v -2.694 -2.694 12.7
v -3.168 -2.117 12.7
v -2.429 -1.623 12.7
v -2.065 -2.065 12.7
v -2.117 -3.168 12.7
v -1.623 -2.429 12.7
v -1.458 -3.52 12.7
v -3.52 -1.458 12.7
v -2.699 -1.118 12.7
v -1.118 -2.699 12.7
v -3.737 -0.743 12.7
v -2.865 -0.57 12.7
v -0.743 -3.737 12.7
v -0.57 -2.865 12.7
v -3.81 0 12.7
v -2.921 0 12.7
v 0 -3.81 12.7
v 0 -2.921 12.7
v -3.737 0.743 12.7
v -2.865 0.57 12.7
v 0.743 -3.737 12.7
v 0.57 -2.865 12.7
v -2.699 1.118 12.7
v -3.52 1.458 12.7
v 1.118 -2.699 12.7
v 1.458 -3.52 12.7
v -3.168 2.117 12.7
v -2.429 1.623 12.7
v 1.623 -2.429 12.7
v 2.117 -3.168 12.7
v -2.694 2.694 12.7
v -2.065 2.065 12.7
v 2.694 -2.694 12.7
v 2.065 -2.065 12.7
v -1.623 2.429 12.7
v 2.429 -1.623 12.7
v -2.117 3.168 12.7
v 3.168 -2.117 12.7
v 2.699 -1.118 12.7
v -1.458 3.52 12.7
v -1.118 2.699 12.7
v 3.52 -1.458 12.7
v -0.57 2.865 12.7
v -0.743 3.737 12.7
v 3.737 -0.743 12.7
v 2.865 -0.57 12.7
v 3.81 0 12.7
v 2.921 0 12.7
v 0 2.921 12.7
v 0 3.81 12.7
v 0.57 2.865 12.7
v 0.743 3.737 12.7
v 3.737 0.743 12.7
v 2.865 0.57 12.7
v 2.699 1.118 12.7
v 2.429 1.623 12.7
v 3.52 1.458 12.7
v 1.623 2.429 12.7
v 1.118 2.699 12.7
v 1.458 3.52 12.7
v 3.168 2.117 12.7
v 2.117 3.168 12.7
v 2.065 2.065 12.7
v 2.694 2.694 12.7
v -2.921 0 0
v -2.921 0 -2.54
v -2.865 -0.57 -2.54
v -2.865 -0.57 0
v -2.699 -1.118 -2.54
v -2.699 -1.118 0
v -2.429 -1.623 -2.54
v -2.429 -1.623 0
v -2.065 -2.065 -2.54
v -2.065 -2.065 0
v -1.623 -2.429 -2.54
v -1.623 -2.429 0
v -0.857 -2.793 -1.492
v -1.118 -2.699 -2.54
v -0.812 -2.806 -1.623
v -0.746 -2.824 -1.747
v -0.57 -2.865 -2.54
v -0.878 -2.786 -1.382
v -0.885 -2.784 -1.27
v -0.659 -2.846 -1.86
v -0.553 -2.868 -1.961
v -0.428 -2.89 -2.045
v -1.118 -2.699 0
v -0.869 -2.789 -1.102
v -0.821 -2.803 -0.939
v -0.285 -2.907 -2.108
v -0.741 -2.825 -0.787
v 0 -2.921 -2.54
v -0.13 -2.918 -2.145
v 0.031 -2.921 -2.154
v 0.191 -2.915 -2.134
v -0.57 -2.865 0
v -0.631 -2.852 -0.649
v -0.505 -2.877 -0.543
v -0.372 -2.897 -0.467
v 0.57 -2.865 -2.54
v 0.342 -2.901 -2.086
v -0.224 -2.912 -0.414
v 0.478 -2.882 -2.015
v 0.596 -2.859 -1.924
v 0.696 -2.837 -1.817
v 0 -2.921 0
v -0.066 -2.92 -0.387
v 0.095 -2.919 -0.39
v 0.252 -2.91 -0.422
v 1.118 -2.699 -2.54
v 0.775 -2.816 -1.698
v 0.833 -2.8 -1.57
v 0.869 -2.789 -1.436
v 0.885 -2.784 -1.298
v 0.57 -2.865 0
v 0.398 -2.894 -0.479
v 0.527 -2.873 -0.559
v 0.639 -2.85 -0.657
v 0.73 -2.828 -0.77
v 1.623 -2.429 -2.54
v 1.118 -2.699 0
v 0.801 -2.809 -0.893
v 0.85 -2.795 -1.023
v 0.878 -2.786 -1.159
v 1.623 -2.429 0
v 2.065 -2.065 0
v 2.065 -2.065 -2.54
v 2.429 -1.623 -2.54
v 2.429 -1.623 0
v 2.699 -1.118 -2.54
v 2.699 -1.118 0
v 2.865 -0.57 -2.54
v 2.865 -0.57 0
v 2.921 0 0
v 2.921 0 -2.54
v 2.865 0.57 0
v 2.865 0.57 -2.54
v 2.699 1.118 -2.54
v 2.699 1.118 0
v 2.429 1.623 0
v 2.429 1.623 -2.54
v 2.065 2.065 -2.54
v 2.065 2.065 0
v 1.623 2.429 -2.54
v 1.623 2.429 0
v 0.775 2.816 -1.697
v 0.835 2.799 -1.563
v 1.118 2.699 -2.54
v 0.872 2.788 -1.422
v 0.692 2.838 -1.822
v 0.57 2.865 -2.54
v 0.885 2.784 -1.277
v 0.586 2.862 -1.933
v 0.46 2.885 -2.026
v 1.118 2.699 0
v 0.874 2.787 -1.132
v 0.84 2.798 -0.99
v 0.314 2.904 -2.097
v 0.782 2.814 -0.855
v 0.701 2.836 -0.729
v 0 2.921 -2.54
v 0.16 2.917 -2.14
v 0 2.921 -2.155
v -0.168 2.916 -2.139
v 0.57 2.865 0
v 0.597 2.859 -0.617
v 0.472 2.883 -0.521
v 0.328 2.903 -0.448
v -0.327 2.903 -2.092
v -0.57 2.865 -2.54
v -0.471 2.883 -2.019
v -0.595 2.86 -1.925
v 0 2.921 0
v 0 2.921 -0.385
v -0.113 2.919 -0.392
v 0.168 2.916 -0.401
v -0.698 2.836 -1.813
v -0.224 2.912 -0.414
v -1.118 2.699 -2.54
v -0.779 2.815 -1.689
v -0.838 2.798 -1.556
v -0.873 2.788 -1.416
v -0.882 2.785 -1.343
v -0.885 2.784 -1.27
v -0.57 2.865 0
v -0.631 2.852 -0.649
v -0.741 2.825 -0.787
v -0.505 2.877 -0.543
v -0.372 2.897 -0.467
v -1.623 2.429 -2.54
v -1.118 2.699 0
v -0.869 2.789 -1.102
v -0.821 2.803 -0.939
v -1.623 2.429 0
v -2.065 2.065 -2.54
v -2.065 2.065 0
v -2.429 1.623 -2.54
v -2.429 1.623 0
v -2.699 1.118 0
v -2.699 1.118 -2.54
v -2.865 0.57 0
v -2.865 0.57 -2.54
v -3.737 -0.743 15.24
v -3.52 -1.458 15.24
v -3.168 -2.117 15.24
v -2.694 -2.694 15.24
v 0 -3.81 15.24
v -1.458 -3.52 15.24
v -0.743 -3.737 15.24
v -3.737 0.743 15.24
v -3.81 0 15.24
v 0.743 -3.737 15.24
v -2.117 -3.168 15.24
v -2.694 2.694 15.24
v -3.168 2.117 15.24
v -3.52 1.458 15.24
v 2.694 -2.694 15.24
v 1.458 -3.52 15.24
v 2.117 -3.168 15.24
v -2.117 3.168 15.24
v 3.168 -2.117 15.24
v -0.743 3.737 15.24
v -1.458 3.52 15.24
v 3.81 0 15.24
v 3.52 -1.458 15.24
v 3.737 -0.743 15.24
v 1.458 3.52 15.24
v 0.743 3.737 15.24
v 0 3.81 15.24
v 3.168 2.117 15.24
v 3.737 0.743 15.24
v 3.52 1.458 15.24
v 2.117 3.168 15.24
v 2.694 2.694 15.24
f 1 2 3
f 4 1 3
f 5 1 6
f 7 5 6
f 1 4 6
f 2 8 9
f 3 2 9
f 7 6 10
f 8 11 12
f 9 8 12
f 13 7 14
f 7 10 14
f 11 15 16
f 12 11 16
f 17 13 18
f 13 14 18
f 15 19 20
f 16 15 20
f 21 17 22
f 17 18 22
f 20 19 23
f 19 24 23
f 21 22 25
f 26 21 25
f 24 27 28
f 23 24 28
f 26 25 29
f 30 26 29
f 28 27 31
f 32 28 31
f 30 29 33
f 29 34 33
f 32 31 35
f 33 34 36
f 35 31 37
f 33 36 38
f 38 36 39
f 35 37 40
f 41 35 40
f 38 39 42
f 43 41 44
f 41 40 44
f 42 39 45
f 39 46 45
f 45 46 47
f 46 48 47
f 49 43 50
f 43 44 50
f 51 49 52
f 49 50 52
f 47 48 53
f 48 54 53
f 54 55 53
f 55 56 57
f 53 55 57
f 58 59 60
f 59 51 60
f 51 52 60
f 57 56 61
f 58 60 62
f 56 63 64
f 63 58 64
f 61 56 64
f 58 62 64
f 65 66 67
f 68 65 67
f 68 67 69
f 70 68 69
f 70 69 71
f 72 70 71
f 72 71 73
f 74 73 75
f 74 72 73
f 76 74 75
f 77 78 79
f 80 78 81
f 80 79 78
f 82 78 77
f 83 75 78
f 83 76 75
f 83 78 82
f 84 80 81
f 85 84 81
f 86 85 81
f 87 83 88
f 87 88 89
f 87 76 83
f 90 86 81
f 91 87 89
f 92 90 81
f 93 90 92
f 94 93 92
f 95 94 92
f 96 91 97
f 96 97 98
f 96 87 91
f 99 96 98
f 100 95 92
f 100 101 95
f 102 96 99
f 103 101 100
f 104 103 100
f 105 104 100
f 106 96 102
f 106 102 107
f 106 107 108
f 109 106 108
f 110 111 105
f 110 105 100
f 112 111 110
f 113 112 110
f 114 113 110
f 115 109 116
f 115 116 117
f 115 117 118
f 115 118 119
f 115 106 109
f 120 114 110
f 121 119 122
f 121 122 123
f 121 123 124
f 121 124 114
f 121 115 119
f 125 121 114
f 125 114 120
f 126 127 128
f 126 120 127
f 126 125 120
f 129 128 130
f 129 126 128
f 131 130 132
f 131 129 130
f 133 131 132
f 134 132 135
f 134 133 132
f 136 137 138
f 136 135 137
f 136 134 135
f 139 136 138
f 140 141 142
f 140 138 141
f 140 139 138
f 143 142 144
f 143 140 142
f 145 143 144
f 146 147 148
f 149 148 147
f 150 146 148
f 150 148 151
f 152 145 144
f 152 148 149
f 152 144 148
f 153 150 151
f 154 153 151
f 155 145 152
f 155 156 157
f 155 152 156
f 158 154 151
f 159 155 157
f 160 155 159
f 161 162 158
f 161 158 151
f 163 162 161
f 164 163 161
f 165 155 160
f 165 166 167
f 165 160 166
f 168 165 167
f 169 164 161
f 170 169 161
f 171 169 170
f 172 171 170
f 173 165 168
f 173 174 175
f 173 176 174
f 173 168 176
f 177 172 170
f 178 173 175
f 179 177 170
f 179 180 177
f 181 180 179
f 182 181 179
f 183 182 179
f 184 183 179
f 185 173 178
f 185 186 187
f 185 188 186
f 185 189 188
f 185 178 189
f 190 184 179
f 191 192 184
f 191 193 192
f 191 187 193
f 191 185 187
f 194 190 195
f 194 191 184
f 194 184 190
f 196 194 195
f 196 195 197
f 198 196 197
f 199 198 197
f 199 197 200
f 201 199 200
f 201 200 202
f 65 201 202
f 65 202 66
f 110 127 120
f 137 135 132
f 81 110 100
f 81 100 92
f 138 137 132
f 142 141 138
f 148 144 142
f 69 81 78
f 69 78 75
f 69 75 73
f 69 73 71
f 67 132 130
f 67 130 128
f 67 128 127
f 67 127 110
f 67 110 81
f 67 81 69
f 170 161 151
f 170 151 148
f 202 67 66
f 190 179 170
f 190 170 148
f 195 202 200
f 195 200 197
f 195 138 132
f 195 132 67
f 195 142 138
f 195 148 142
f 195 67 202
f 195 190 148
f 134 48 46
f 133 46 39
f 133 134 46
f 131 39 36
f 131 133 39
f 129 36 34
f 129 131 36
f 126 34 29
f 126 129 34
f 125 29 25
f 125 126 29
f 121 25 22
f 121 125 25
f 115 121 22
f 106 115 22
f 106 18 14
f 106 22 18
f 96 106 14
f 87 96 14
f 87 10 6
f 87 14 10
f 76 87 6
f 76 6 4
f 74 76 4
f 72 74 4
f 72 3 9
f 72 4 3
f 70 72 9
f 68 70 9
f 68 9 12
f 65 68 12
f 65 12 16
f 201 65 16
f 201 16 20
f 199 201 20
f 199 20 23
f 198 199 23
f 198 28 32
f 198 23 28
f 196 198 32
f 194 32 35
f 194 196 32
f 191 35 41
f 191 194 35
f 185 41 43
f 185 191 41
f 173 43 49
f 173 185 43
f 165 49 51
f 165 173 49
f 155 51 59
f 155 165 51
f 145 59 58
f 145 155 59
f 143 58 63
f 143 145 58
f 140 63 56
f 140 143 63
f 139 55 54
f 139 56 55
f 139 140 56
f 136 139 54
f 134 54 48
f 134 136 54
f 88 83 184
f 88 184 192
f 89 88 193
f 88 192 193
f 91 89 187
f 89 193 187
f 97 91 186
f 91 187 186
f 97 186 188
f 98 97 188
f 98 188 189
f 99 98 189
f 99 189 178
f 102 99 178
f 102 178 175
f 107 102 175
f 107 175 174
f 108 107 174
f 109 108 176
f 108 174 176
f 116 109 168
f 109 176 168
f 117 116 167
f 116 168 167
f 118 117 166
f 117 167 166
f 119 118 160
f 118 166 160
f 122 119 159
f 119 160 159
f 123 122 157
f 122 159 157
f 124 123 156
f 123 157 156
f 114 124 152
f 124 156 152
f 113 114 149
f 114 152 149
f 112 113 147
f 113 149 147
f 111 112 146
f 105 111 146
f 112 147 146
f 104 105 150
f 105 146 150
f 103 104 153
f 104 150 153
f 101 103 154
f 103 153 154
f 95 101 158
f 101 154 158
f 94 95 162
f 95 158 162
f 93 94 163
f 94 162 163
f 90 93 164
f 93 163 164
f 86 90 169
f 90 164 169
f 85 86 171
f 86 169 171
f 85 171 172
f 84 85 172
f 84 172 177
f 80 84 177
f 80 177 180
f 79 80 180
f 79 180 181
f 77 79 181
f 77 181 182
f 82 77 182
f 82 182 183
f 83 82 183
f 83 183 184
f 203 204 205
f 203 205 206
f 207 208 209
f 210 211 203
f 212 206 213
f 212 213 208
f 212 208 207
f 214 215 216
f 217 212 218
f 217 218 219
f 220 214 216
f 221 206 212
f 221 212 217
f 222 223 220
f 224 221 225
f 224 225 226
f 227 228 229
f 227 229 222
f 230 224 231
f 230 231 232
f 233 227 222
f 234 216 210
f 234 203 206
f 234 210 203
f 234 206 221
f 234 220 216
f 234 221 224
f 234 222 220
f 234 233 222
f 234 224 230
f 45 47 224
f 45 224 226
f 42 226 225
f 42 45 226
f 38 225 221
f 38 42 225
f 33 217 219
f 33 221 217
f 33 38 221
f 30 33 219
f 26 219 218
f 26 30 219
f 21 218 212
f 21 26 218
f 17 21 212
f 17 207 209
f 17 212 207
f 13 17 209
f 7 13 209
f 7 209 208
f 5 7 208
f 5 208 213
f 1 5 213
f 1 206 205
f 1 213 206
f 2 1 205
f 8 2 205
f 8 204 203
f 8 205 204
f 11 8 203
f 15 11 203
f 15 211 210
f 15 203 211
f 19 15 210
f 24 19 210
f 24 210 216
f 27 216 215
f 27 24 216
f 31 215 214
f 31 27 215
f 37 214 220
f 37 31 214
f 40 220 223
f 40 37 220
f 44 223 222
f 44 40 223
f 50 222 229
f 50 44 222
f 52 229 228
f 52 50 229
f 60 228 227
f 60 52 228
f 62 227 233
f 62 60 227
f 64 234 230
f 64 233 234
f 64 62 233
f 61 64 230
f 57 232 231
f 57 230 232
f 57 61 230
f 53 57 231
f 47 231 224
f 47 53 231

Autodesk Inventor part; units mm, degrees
ref_plane "YZ Plane" through (0, 0, 0) normal (1, 0, 0) x (0, 1, 0)
ref_plane "XZ Plane" through (0, 0, 0) normal (0, 1, 0) x (-1, 0, 0)
sketch "Sketch1" plane through (0, 0, 0) normal (0, 0, 1) x (1, 0, 0)
  circle A0 centre (0, 0) radius 2.921
  dimension "d0" = 5.842
extrude "Extrusion1" add sketch "Sketch1" along normal blind 12.7
sketch "Sketch2" plane through (0, 0, 12.7) normal (0, 0, 1) x (1, 0, 0)
  circle A0 centre (0, 0) radius 3.81
  dimension "d3" = 7.62
extrude "Extrusion2" add sketch "Sketch2" along normal blind 2.54
sketch "Sketch3" plane through (0, 0, 0) normal (0, 0, -1) x (-1, 0, 0)
  circle A0 centre (0, 0) radius 2.921
  dimension "d12" = 5.842
extrude "Extrusion3" add sketch "Sketch3" along normal blind 2.54
sketch "Sketch4" plane through (0, 0, -2.54) normal (0, 0, -1) x (-1, 0, 0)
  circle A0 centre (0, 0) radius 2.921 projected
  point P0 (0, 2.921)
ref_plane "Work Plane1" through (0, 2.921, -2.54) normal (0, 1, 0) x (-1, 0, 0)
sketch "Sketch5" plane through (0, 2.921, -2.54) normal (0, 1, 0) x (-1, 0, 0)
  circle A0 centre (0, 1.27) radius 0.885
  line L0 (-2.921, 0) -> (2.921, 0) projected
  point P0 (0, 2.54)
  dimension "d8" = 1.77
  dimension "d9" = 1.27
extrude "Extrusion4" cut sketch "Sketch5" against normal blind 7.3025
properties part number "Pin"
